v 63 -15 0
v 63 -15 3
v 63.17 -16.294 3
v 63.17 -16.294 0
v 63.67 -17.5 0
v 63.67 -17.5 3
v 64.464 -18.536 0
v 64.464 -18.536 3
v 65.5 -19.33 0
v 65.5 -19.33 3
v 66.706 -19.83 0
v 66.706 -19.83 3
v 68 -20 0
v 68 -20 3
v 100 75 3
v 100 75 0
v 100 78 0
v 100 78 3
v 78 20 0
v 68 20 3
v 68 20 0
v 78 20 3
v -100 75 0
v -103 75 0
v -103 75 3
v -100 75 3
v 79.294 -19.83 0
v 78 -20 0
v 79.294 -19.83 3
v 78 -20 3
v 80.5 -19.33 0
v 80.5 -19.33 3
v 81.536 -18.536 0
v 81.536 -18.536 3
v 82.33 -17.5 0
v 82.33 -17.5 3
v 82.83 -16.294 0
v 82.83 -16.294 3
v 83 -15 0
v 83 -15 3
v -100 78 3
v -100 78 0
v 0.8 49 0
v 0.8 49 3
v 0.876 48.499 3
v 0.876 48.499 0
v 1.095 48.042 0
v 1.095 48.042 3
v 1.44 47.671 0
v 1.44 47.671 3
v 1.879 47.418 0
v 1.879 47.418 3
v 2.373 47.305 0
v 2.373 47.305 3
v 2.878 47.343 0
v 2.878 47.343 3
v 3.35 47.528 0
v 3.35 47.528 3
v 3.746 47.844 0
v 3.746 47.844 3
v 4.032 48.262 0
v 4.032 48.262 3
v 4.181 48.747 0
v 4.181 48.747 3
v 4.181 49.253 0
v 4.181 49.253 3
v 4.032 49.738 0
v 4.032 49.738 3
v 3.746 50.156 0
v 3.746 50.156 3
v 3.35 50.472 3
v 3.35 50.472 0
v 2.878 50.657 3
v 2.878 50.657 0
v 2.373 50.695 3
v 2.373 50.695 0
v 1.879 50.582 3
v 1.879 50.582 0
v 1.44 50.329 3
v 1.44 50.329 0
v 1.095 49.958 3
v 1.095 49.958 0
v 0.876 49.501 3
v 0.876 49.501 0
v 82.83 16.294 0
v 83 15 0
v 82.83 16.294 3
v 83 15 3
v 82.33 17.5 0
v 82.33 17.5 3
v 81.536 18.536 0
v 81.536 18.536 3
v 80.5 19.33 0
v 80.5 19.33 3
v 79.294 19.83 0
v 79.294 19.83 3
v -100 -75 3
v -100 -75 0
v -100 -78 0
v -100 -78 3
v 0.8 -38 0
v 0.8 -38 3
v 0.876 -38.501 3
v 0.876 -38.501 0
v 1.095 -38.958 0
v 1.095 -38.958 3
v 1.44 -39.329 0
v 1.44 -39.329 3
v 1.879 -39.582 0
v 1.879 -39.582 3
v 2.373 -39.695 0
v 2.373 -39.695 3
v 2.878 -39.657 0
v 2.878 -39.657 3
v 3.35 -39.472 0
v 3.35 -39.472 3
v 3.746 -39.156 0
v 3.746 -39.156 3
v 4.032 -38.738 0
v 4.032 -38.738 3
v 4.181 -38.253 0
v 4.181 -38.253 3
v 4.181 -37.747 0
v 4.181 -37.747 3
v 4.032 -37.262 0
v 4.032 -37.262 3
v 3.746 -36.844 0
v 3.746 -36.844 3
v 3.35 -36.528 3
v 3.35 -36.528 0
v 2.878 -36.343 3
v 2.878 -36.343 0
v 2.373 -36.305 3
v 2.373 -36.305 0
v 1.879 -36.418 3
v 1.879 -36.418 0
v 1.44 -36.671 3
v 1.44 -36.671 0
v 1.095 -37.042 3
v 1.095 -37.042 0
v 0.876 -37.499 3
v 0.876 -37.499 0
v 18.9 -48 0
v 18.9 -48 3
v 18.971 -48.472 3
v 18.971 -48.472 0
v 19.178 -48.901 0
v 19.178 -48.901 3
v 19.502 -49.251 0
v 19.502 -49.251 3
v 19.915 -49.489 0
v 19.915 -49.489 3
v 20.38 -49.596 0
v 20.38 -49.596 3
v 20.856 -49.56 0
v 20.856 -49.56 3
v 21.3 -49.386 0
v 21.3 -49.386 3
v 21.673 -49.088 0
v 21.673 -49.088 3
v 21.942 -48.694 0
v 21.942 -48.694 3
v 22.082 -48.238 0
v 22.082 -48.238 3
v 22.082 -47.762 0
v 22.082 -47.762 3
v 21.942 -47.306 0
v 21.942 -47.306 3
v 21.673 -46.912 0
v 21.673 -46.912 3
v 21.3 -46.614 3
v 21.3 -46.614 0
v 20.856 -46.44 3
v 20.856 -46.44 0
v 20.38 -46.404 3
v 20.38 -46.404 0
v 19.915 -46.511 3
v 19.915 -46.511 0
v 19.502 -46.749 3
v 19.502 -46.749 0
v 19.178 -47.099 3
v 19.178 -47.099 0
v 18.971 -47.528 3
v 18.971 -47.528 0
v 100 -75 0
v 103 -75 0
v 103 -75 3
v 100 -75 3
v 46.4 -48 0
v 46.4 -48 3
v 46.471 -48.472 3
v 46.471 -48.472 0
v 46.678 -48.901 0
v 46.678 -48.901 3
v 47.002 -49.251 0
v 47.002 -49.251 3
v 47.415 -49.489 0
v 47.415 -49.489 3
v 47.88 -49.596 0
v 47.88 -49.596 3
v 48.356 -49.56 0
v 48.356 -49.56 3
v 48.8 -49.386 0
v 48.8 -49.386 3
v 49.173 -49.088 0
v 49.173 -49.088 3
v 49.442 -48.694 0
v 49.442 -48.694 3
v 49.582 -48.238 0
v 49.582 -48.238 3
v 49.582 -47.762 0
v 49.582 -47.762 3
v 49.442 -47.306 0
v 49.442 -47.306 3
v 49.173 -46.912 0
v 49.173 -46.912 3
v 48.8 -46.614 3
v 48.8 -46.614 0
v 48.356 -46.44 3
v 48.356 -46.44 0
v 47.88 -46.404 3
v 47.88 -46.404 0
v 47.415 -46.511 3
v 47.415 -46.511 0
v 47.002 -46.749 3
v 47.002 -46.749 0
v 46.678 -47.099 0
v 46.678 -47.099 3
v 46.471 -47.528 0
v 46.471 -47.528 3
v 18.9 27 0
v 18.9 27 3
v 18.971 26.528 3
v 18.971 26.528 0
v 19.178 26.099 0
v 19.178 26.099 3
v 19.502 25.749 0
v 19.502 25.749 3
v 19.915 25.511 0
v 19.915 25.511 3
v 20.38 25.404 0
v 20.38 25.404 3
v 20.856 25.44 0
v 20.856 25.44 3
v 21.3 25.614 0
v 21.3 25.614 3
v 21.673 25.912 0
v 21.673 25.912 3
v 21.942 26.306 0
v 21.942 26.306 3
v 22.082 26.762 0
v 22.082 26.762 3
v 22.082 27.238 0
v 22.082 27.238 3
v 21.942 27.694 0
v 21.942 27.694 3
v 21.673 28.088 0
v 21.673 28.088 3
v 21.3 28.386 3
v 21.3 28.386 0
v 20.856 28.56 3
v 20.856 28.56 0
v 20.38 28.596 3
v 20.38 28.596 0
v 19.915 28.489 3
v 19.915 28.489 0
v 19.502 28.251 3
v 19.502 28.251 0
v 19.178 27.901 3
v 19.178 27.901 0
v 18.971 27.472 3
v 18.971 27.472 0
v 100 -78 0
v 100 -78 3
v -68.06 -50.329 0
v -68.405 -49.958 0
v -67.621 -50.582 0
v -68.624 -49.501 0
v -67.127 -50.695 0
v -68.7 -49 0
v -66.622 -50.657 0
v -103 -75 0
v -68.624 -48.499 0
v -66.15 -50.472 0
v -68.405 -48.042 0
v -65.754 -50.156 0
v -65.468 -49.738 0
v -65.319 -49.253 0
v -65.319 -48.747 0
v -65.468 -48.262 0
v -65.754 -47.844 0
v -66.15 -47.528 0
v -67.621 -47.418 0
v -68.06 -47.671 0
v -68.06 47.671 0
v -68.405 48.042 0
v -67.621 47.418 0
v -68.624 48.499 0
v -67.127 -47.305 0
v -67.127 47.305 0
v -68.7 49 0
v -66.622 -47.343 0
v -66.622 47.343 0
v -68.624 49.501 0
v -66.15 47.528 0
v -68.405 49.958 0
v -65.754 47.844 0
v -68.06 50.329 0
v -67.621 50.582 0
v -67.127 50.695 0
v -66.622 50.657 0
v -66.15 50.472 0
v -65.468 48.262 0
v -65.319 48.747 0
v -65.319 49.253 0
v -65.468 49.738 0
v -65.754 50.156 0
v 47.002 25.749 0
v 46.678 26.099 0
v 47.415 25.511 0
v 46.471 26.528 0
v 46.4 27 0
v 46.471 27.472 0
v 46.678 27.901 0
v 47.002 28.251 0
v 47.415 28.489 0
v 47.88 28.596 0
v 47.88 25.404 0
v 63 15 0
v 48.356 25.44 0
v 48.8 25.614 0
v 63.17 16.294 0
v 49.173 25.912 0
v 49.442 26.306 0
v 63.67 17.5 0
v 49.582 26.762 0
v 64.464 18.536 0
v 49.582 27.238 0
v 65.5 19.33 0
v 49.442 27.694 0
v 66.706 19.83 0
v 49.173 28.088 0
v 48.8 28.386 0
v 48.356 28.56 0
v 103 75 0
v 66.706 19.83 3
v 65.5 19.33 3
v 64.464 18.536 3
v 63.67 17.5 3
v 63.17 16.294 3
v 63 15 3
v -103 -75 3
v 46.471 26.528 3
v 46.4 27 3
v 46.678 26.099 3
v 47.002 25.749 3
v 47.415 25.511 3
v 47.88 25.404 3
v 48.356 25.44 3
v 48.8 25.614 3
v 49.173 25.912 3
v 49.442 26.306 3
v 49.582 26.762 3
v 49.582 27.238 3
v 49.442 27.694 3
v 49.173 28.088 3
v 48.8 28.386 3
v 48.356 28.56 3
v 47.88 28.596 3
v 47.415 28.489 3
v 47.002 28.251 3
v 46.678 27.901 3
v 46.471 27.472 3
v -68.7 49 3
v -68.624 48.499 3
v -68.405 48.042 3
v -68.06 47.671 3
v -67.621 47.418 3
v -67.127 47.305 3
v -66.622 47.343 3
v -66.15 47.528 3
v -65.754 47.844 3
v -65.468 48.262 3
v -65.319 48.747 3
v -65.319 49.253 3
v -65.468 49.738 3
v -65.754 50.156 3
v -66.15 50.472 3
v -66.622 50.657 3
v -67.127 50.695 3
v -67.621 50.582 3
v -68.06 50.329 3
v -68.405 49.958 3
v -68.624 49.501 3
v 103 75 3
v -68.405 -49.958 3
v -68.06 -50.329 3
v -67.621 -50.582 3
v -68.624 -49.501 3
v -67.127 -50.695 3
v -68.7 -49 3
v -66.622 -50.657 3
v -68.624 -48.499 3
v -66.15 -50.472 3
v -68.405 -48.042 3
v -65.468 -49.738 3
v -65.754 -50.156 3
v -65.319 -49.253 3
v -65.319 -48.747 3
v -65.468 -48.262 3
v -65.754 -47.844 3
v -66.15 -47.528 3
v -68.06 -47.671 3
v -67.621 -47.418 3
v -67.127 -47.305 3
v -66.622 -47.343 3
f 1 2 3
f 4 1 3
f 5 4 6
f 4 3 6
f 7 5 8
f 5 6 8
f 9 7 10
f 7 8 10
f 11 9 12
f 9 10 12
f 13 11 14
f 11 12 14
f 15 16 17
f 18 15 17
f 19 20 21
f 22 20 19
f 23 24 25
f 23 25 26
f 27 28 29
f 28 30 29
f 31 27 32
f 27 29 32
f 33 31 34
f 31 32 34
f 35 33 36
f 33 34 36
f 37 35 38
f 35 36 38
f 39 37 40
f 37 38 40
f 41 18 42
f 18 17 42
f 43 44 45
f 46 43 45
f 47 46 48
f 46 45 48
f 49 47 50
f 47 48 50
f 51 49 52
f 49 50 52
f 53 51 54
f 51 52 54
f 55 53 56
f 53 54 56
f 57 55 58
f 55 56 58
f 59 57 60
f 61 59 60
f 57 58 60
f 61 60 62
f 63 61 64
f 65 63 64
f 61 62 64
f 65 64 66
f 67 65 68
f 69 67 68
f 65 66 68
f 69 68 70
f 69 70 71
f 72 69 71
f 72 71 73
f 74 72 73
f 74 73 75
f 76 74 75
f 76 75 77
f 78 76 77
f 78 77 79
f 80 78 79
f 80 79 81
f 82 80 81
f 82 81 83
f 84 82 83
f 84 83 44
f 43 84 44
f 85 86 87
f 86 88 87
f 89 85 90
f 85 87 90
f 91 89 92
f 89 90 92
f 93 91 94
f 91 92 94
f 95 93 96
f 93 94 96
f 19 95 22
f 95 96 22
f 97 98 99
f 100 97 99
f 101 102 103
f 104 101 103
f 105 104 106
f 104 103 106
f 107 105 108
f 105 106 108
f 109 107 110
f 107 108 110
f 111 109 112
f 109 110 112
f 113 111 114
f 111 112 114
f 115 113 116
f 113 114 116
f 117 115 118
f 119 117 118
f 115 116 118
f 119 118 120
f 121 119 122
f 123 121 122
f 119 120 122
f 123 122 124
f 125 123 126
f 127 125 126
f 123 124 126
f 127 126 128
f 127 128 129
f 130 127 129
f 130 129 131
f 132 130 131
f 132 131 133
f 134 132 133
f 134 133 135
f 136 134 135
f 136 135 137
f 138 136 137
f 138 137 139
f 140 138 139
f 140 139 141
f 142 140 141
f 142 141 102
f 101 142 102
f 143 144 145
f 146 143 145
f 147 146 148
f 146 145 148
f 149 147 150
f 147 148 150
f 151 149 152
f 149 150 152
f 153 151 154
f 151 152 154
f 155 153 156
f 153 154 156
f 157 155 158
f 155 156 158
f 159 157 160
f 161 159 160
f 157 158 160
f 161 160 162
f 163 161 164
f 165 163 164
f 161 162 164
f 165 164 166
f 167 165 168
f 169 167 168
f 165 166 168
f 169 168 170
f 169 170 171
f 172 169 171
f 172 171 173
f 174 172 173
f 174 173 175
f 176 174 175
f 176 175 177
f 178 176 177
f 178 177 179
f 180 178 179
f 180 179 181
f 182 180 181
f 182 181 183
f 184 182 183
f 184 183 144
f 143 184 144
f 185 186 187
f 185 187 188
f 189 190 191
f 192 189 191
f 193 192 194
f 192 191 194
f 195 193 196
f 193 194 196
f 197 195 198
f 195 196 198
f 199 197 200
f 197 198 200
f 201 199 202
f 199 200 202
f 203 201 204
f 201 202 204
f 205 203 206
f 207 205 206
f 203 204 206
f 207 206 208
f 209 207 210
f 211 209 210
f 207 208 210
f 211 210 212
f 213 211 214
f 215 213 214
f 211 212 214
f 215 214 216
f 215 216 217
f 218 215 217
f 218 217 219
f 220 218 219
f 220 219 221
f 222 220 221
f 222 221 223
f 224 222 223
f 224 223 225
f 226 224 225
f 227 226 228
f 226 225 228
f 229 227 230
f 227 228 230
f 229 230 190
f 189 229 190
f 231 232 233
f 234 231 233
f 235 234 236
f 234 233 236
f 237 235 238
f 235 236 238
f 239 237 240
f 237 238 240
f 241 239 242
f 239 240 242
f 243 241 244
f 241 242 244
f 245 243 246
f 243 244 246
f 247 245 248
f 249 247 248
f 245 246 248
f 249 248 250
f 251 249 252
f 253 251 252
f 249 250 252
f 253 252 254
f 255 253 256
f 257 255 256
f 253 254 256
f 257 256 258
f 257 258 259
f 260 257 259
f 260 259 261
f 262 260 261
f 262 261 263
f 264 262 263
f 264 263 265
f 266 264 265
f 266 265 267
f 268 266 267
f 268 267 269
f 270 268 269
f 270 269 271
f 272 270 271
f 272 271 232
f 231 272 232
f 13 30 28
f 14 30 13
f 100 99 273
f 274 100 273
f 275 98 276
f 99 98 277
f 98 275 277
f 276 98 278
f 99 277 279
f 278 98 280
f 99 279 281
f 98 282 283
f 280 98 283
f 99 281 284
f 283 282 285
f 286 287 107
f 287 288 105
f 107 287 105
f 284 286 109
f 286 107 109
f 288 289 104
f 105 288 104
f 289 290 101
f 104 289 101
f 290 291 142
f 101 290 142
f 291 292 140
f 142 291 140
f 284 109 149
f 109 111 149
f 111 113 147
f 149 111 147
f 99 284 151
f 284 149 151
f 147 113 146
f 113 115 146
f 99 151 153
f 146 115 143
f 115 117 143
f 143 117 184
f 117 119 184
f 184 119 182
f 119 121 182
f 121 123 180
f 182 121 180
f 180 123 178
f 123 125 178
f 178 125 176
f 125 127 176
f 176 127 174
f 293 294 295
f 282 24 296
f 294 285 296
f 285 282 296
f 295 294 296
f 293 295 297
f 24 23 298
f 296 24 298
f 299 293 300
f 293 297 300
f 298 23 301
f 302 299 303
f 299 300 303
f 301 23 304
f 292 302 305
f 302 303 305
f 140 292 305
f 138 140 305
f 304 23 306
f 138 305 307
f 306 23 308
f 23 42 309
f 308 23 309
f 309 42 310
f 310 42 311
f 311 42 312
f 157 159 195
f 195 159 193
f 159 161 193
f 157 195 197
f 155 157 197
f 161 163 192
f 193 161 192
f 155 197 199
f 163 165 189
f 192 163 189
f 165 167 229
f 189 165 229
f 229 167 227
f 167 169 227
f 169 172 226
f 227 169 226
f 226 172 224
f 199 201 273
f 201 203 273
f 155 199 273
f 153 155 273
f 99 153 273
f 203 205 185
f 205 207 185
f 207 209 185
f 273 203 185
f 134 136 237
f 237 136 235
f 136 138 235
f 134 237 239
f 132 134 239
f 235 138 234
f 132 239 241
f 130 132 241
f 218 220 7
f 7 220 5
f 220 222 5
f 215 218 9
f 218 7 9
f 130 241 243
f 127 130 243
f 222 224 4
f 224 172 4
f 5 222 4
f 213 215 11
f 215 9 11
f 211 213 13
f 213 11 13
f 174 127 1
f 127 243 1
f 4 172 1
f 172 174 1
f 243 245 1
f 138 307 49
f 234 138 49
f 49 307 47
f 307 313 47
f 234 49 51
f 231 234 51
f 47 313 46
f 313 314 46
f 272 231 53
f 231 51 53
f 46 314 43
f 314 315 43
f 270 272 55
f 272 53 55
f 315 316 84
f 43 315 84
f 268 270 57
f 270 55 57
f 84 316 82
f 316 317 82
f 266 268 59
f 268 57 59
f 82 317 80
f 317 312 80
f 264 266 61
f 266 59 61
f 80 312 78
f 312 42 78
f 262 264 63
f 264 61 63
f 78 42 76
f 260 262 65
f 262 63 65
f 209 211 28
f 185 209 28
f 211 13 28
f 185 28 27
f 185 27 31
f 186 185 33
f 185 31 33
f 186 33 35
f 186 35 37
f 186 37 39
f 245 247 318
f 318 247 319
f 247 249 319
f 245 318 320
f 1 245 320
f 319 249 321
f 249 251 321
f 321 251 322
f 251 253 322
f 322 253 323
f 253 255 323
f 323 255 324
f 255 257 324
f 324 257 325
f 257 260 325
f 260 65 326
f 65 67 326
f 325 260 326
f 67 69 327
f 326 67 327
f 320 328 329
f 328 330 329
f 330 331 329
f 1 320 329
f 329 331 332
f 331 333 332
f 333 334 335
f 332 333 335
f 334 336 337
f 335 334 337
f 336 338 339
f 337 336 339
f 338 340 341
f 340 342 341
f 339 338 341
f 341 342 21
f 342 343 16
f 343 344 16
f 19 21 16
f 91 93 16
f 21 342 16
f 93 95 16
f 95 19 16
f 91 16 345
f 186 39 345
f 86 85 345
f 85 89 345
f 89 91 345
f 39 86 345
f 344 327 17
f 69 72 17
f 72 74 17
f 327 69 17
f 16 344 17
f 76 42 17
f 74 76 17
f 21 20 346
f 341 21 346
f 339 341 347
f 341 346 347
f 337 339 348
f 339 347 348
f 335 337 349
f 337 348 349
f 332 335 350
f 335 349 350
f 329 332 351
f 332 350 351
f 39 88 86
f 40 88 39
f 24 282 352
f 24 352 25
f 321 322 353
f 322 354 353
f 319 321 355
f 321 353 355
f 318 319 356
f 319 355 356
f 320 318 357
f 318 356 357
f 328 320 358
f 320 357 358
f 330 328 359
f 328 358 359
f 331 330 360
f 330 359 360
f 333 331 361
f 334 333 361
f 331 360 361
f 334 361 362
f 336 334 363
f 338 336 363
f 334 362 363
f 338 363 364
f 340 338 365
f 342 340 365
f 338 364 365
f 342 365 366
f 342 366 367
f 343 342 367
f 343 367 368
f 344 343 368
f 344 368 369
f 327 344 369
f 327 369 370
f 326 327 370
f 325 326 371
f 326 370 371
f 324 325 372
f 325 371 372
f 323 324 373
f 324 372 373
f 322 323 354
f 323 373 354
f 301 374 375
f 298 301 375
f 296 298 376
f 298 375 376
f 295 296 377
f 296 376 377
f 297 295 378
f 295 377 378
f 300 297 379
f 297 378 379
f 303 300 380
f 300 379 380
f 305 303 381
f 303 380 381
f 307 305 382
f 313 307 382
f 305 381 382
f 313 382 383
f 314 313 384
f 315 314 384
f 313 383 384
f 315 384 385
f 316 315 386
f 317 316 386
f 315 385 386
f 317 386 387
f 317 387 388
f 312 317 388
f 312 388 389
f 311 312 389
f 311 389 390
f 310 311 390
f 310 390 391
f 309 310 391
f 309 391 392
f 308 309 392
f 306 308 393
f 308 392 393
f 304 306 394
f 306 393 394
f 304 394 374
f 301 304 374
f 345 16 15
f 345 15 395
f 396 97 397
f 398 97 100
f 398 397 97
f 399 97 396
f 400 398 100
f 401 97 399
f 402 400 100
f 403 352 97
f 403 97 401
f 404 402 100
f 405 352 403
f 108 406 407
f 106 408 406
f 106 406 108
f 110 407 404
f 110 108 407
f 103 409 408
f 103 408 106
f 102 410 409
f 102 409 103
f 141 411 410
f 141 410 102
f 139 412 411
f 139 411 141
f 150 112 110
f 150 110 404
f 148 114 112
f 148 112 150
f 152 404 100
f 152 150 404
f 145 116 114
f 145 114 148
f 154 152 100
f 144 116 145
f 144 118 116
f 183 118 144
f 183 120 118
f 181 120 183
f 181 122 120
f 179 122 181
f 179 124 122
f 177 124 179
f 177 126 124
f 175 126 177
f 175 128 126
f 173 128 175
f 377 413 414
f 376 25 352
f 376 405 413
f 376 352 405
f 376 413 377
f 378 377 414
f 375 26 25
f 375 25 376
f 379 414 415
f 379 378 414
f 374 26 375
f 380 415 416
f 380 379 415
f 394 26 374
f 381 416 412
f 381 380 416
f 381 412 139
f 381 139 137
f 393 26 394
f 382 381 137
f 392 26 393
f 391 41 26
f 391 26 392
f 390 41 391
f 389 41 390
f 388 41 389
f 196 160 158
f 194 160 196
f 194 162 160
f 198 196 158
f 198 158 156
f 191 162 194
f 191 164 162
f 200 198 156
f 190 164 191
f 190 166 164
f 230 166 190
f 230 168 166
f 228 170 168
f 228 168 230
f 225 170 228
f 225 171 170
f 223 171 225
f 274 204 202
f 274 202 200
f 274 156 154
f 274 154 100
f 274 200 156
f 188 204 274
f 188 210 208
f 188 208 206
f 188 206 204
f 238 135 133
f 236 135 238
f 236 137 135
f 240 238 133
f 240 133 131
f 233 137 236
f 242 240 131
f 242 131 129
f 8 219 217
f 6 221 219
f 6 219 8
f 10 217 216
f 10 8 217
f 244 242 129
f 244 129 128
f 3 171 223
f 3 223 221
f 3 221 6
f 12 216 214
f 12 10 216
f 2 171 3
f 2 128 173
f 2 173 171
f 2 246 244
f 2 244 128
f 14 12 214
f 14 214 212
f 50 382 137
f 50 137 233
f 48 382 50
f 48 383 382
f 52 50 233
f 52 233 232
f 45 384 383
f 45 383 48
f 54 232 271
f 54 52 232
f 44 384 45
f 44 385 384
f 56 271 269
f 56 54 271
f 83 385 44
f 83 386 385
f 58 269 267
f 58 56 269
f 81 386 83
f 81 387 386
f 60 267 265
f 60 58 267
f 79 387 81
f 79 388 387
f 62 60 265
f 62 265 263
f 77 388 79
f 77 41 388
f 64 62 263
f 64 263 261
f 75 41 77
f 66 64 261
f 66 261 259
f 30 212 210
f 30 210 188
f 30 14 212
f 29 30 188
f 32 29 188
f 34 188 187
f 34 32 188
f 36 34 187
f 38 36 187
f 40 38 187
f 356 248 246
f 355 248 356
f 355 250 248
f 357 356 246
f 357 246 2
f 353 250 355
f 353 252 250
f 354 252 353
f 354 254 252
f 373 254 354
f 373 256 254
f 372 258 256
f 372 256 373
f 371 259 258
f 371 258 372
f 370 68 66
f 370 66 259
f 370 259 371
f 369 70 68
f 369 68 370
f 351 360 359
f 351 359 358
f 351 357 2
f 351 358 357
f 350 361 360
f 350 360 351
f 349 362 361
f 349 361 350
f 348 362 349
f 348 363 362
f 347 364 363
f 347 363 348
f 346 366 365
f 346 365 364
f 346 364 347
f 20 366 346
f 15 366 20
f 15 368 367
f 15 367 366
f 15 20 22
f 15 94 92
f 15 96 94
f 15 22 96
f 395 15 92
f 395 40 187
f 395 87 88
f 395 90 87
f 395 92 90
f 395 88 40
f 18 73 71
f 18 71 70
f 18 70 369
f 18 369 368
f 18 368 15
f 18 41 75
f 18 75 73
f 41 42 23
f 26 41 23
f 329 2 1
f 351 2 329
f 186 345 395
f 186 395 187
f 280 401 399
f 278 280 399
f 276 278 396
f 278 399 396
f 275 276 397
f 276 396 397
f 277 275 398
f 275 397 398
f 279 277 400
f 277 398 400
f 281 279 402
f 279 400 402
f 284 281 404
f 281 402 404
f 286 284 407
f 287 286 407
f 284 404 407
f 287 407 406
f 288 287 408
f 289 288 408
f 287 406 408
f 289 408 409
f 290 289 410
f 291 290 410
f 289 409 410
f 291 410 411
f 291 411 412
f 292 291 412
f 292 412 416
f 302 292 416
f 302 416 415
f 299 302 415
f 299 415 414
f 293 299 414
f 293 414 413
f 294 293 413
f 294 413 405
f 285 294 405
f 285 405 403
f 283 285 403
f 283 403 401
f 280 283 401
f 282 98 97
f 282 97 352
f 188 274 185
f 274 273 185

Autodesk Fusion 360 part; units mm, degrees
sketch "Esquisse1" plane through (0, 0, 0) normal (0, 0, 1) x (1, 0, 0)
  line L0 (100, 78) -> (-100, 78)
  line L1 (-100, 78) -> (-100, -78)
  line L2 (-100, -78) -> (100, -78)
  line L3 (100, -78) -> (100, 78)
  line L4 (100, 78) -> (-100, -78) construction
  line L5 (-100, 78) -> (100, -78) construction
  line L6 (103, -75) -> (-103, -75)
  line L7 (-103, -75) -> (-103, 75)
  line L8 (-103, 75) -> (103, 75)
  line L9 (103, 75) -> (103, -75)
  line L10 (103, -75) -> (-103, 75) construction
  line L11 (-103, -75) -> (103, 75) construction
  dimension "d1" = 200
  dimension "d2" = 206
  dimension "d3" = 150
  dimension "d4" = 156
extrude "Extrusion1" add sketch "Esquisse1" along normal blind 3
sketch "Esquisse4" plane through (0, 0, 3) normal (0, 0, 1) x (-1, 0, 0)
  line L0 (-100, -75) -> (-100, -78)
  line L1 (-100, -78) -> (100, -78)
  line L2 (100, -78) -> (100, -75)
  line L3 (100, -75) -> (103, -75)
  line L4 (103, -75) -> (103, 75)
  line L5 (103, 75) -> (100, 75)
  line L6 (100, 75) -> (100, 78)
  line L7 (100, 78) -> (-100, 78)
  line L8 (-100, 78) -> (-100, 75)
  line L9 (-100, 75) -> (-103, 75)
  line L10 (-103, 75) -> (-103, -75)
  line L11 (-103, -75) -> (-100, -75)
  line L12 (-2.5, 49) -> (67, 49)
  line L13 (67, 49) -> (67, -49)
  line L14 (67, -49) -> (-2.5, -49)
  line L15 (-2.5, -49) -> (-2.5, 49)
  line L16 (-2.5, 49) -> (67, -49) construction
  line L17 (67, 49) -> (-2.5, -49) construction
  line L18 (-48, 48) -> (-20.5, 48)
  line L19 (-20.5, 48) -> (-20.5, -27)
  line L20 (-20.5, -27) -> (-48, -27)
  line L21 (-48, -27) -> (-48, 48)
  line L22 (-48, 48) -> (-20.5, -27) construction
  line L23 (-20.5, 48) -> (-48, -27) construction
  circle A0 centre (67, -49) radius 1.7
  circle A1 centre (-2.5, -49) radius 1.7
  circle A2 centre (-20.5, -27) radius 1.6
  circle A3 centre (-48, -27) radius 1.6
  circle A4 centre (-20.5, 48) radius 1.6
  circle A5 centre (-48, 48) radius 1.6
  line L24 (67, -49) -> (-2.5, -49)
  line L25 (-2.5, -49) -> (-2.5, 38)
  line L26 (-2.5, 38) -> (67, 38)
  line L27 (67, 38) -> (67, -49)
  circle A6 centre (67, 49) radius 1.7
  circle A7 centre (-2.5, 38) radius 1.7
  line L28 (-83, -15) -> (-83, 15)
  line L29 (-68, -20) -> (-78, -20)
  arc A8 (-68, -20) -> (-63, -15) centre (-68, -15) ccw
  line L30 (-63, 20) -> (-83, -20) construction
  line L31 (-78, 20) -> (-68, 20)
  arc A9 (-63, 15) -> (-68, 20) centre (-68, 15) ccw
  arc A10 (-78, 20) -> (-83, 15) centre (-78, 15) ccw
  line L32 (-83, 20) -> (-63, -20) construction
  line L33 (-63, 15) -> (-63, -15)
  arc A11 (-83, -15) -> (-78, -20) centre (-78, -15) ccw
  point P0 (32.25, 0)
  point P1 (-34.25, 10.5)
  point P2 (-73, 0)
  dimension "d26" = 69.5
  dimension "d27" = 98
  dimension "d28" = 27.5
  dimension "d29" = 75
  dimension "d30" = 18
  dimension "d31" = 3.4
  dimension "d34" = 3.4
  dimension "d35" = 3.2
  dimension "d36" = 3.2
  dimension "d37" = 3.2
  dimension "d38" = 3.2
  dimension "d39" = 87
  dimension "d43" = 3.4
  dimension "d44" = 3.4
  dimension "d45" = 5
  dimension "d46" = 20
  dimension "d47" = 15
  dimension "d48" = 20
  dimension "d49" = 40
  dimension "d50" = 29
  dimension "d51" = 58
  dimension "d52" = 30
extrude "Extrusion4" cut sketch "Esquisse4" against normal blind 3 contours L12 L13 A6 | L12 L13 A6 | L15 L26 A7 | L15 L25 A7 | L15 L25 L26 A7 | L14 L15 A1 L24 L25 | L14 L15 A1 L24 L25 | L13 L14 A0 L24 L27 | L13 L14 A0 L24 L27 | L18 L21 A5 | L18 L21 A5 | L18 L19 A4 | L18 L19 A4 | L20 L21 A3 | L20 L21 A3 | L19 L20 A2 | L19 L20 A2 | L28 L29 A8 L31 A9 A10 L33 A11
equation "d2 = d1 + ( 2 * 3 ) * 1 mm"
equation "d4 = d3 + ( 2 * 3 ) * 1 mm"
